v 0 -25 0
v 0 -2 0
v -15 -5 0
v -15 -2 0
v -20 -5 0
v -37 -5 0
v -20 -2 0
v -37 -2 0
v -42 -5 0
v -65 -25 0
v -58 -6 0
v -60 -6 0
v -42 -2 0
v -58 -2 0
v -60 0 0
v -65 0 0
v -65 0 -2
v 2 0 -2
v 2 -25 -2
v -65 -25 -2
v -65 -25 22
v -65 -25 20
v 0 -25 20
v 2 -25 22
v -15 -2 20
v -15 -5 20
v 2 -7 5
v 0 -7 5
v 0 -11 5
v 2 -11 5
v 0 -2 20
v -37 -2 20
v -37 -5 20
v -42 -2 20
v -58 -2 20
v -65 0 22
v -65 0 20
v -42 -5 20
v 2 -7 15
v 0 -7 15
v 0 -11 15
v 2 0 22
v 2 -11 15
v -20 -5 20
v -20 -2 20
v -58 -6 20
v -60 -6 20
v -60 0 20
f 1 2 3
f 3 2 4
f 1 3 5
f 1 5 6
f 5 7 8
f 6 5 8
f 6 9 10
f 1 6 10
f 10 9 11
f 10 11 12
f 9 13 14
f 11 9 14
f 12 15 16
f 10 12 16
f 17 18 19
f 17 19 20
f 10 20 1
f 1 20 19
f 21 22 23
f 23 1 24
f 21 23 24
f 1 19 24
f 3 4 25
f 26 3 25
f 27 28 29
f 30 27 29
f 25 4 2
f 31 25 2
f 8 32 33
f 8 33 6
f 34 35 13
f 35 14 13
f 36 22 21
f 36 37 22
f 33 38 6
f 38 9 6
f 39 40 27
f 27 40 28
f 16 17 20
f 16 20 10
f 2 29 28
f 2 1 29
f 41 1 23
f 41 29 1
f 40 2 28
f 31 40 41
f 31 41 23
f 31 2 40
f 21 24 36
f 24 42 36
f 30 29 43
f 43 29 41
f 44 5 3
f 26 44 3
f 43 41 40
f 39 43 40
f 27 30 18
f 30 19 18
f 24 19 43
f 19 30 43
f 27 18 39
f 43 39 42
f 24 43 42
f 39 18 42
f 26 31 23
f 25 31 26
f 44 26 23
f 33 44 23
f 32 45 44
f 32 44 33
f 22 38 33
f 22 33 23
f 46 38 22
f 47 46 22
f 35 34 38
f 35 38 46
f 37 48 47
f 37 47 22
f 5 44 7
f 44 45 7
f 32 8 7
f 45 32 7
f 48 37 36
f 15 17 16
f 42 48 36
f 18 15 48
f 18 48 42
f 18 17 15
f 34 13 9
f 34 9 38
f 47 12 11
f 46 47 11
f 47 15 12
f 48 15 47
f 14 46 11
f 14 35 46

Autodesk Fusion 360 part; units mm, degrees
sketch "Sketch1" plane through (0, 0, 0) normal (0, 1, 0) x (1, 0, 0)
  line L0 (0, 0) -> (-58, 0)
  line L1 (-58, 0) -> (-58, -20)
  line L2 (-58, -20) -> (0, -20)
  line L3 (0, -20) -> (0, 0)
extrude "Extrude1" add sketch "Sketch1" against normal blind 2
sketch "Sketch2" plane through (0, 0, 0) normal (0, 1, 0) x (1, 0, 0)
  line L0 (-60, -22) -> (2, -22)
  line L1 (2, -22) -> (2, -20)
  line L2 (2, -20) -> (-60, -20)
  line L3 (-60, -20) -> (-60, -22)
extrude "Extrude2" add sketch "Sketch2" against normal blind 7
sketch "Sketch3" plane through (0, 0, 0) normal (0, 1, 0) x (1, 0, 0)
  line L0 (-60, 0) -> (2, 0)
  line L1 (2, 0) -> (2, 2)
  line L2 (2, 2) -> (-60, 2)
  line L3 (-60, 2) -> (-60, 0)
extrude "Extrude3" add sketch "Sketch3" against normal blind 7
sketch "Sketch4" plane through (0, 0, 0) normal (0, 1, 0) x (1, 0, 0)
  line L0 (0, -20) -> (2, -20)
  line L1 (2, -20) -> (2, 0)
  line L2 (2, 0) -> (0, 0)
  line L3 (0, 0) -> (0, -20)
extrude "Extrude4" add sketch "Sketch4" against normal blind 7
sketch "Sketch5" plane through (0, 0, 0) normal (0, 1, 0) x (1, 0, 0)
  line L0 (-42, -20) -> (-37, -20)
  line L1 (-37, -20) -> (-37, 0)
  line L2 (-37, 0) -> (-42, 0)
  line L3 (-42, 0) -> (-42, -20)
sketch "Sketch6" plane through (0, 0, 0) normal (0, 1, 0) x (1, 0, 0)
extrude "Extrude5" add sketch "Sketch5" against normal blind 5
sketch "Sketch7" plane through (0, 0, 0) normal (0, 1, 0) x (1, 0, 0)
  line L0 (-15, -20) -> (-20, -20)
  line L1 (-20, -20) -> (-20, 0)
  line L2 (-20, 0) -> (-15, 0)
  line L3 (-15, 0) -> (-15, -20)
extrude "Extrude6" add sketch "Sketch7" against normal blind 5
extrude "Extrude7" add 1 faces at (-60, -2.3333, 20.6667) along direction (-1, 0, 0) blind 5
extrude "Extrude8" add 1 faces at (-60, -2.3333, -1.3333) along direction (-1, 0, 0) blind 5
extrude "Extrude9" add 1 faces at (-21, -7, -1.3333) along direction (0, -1, 0) blind 18
sketch "Sketch8" plane through (0, 0, 0) normal (1, 0, 0) x (0, 1, 0)
  line L0 (-7, 5) -> (-11, 5)
  line L1 (-11, 5) -> (-11, 15)
  line L2 (-11, 15) -> (-7, 15)
  line L3 (-7, 15) -> (-7, 5)
extrude "Extrude10" cut sketch "Sketch8" along normal blind 2
sketch "Sketch9" plane through (0, 0, 0) normal (0, 1, 0) x (1, 0, 0)
  line L0 (-60, -20) -> (-58, -20)
  line L1 (-58, -20) -> (-58, 0)
  line L2 (-58, 0) -> (-60, 0)
  line L3 (-60, 0) -> (-60, -20)
  dimension "d21" = 2
extrude "Extrude11" add sketch "Sketch9" against normal blind 6
